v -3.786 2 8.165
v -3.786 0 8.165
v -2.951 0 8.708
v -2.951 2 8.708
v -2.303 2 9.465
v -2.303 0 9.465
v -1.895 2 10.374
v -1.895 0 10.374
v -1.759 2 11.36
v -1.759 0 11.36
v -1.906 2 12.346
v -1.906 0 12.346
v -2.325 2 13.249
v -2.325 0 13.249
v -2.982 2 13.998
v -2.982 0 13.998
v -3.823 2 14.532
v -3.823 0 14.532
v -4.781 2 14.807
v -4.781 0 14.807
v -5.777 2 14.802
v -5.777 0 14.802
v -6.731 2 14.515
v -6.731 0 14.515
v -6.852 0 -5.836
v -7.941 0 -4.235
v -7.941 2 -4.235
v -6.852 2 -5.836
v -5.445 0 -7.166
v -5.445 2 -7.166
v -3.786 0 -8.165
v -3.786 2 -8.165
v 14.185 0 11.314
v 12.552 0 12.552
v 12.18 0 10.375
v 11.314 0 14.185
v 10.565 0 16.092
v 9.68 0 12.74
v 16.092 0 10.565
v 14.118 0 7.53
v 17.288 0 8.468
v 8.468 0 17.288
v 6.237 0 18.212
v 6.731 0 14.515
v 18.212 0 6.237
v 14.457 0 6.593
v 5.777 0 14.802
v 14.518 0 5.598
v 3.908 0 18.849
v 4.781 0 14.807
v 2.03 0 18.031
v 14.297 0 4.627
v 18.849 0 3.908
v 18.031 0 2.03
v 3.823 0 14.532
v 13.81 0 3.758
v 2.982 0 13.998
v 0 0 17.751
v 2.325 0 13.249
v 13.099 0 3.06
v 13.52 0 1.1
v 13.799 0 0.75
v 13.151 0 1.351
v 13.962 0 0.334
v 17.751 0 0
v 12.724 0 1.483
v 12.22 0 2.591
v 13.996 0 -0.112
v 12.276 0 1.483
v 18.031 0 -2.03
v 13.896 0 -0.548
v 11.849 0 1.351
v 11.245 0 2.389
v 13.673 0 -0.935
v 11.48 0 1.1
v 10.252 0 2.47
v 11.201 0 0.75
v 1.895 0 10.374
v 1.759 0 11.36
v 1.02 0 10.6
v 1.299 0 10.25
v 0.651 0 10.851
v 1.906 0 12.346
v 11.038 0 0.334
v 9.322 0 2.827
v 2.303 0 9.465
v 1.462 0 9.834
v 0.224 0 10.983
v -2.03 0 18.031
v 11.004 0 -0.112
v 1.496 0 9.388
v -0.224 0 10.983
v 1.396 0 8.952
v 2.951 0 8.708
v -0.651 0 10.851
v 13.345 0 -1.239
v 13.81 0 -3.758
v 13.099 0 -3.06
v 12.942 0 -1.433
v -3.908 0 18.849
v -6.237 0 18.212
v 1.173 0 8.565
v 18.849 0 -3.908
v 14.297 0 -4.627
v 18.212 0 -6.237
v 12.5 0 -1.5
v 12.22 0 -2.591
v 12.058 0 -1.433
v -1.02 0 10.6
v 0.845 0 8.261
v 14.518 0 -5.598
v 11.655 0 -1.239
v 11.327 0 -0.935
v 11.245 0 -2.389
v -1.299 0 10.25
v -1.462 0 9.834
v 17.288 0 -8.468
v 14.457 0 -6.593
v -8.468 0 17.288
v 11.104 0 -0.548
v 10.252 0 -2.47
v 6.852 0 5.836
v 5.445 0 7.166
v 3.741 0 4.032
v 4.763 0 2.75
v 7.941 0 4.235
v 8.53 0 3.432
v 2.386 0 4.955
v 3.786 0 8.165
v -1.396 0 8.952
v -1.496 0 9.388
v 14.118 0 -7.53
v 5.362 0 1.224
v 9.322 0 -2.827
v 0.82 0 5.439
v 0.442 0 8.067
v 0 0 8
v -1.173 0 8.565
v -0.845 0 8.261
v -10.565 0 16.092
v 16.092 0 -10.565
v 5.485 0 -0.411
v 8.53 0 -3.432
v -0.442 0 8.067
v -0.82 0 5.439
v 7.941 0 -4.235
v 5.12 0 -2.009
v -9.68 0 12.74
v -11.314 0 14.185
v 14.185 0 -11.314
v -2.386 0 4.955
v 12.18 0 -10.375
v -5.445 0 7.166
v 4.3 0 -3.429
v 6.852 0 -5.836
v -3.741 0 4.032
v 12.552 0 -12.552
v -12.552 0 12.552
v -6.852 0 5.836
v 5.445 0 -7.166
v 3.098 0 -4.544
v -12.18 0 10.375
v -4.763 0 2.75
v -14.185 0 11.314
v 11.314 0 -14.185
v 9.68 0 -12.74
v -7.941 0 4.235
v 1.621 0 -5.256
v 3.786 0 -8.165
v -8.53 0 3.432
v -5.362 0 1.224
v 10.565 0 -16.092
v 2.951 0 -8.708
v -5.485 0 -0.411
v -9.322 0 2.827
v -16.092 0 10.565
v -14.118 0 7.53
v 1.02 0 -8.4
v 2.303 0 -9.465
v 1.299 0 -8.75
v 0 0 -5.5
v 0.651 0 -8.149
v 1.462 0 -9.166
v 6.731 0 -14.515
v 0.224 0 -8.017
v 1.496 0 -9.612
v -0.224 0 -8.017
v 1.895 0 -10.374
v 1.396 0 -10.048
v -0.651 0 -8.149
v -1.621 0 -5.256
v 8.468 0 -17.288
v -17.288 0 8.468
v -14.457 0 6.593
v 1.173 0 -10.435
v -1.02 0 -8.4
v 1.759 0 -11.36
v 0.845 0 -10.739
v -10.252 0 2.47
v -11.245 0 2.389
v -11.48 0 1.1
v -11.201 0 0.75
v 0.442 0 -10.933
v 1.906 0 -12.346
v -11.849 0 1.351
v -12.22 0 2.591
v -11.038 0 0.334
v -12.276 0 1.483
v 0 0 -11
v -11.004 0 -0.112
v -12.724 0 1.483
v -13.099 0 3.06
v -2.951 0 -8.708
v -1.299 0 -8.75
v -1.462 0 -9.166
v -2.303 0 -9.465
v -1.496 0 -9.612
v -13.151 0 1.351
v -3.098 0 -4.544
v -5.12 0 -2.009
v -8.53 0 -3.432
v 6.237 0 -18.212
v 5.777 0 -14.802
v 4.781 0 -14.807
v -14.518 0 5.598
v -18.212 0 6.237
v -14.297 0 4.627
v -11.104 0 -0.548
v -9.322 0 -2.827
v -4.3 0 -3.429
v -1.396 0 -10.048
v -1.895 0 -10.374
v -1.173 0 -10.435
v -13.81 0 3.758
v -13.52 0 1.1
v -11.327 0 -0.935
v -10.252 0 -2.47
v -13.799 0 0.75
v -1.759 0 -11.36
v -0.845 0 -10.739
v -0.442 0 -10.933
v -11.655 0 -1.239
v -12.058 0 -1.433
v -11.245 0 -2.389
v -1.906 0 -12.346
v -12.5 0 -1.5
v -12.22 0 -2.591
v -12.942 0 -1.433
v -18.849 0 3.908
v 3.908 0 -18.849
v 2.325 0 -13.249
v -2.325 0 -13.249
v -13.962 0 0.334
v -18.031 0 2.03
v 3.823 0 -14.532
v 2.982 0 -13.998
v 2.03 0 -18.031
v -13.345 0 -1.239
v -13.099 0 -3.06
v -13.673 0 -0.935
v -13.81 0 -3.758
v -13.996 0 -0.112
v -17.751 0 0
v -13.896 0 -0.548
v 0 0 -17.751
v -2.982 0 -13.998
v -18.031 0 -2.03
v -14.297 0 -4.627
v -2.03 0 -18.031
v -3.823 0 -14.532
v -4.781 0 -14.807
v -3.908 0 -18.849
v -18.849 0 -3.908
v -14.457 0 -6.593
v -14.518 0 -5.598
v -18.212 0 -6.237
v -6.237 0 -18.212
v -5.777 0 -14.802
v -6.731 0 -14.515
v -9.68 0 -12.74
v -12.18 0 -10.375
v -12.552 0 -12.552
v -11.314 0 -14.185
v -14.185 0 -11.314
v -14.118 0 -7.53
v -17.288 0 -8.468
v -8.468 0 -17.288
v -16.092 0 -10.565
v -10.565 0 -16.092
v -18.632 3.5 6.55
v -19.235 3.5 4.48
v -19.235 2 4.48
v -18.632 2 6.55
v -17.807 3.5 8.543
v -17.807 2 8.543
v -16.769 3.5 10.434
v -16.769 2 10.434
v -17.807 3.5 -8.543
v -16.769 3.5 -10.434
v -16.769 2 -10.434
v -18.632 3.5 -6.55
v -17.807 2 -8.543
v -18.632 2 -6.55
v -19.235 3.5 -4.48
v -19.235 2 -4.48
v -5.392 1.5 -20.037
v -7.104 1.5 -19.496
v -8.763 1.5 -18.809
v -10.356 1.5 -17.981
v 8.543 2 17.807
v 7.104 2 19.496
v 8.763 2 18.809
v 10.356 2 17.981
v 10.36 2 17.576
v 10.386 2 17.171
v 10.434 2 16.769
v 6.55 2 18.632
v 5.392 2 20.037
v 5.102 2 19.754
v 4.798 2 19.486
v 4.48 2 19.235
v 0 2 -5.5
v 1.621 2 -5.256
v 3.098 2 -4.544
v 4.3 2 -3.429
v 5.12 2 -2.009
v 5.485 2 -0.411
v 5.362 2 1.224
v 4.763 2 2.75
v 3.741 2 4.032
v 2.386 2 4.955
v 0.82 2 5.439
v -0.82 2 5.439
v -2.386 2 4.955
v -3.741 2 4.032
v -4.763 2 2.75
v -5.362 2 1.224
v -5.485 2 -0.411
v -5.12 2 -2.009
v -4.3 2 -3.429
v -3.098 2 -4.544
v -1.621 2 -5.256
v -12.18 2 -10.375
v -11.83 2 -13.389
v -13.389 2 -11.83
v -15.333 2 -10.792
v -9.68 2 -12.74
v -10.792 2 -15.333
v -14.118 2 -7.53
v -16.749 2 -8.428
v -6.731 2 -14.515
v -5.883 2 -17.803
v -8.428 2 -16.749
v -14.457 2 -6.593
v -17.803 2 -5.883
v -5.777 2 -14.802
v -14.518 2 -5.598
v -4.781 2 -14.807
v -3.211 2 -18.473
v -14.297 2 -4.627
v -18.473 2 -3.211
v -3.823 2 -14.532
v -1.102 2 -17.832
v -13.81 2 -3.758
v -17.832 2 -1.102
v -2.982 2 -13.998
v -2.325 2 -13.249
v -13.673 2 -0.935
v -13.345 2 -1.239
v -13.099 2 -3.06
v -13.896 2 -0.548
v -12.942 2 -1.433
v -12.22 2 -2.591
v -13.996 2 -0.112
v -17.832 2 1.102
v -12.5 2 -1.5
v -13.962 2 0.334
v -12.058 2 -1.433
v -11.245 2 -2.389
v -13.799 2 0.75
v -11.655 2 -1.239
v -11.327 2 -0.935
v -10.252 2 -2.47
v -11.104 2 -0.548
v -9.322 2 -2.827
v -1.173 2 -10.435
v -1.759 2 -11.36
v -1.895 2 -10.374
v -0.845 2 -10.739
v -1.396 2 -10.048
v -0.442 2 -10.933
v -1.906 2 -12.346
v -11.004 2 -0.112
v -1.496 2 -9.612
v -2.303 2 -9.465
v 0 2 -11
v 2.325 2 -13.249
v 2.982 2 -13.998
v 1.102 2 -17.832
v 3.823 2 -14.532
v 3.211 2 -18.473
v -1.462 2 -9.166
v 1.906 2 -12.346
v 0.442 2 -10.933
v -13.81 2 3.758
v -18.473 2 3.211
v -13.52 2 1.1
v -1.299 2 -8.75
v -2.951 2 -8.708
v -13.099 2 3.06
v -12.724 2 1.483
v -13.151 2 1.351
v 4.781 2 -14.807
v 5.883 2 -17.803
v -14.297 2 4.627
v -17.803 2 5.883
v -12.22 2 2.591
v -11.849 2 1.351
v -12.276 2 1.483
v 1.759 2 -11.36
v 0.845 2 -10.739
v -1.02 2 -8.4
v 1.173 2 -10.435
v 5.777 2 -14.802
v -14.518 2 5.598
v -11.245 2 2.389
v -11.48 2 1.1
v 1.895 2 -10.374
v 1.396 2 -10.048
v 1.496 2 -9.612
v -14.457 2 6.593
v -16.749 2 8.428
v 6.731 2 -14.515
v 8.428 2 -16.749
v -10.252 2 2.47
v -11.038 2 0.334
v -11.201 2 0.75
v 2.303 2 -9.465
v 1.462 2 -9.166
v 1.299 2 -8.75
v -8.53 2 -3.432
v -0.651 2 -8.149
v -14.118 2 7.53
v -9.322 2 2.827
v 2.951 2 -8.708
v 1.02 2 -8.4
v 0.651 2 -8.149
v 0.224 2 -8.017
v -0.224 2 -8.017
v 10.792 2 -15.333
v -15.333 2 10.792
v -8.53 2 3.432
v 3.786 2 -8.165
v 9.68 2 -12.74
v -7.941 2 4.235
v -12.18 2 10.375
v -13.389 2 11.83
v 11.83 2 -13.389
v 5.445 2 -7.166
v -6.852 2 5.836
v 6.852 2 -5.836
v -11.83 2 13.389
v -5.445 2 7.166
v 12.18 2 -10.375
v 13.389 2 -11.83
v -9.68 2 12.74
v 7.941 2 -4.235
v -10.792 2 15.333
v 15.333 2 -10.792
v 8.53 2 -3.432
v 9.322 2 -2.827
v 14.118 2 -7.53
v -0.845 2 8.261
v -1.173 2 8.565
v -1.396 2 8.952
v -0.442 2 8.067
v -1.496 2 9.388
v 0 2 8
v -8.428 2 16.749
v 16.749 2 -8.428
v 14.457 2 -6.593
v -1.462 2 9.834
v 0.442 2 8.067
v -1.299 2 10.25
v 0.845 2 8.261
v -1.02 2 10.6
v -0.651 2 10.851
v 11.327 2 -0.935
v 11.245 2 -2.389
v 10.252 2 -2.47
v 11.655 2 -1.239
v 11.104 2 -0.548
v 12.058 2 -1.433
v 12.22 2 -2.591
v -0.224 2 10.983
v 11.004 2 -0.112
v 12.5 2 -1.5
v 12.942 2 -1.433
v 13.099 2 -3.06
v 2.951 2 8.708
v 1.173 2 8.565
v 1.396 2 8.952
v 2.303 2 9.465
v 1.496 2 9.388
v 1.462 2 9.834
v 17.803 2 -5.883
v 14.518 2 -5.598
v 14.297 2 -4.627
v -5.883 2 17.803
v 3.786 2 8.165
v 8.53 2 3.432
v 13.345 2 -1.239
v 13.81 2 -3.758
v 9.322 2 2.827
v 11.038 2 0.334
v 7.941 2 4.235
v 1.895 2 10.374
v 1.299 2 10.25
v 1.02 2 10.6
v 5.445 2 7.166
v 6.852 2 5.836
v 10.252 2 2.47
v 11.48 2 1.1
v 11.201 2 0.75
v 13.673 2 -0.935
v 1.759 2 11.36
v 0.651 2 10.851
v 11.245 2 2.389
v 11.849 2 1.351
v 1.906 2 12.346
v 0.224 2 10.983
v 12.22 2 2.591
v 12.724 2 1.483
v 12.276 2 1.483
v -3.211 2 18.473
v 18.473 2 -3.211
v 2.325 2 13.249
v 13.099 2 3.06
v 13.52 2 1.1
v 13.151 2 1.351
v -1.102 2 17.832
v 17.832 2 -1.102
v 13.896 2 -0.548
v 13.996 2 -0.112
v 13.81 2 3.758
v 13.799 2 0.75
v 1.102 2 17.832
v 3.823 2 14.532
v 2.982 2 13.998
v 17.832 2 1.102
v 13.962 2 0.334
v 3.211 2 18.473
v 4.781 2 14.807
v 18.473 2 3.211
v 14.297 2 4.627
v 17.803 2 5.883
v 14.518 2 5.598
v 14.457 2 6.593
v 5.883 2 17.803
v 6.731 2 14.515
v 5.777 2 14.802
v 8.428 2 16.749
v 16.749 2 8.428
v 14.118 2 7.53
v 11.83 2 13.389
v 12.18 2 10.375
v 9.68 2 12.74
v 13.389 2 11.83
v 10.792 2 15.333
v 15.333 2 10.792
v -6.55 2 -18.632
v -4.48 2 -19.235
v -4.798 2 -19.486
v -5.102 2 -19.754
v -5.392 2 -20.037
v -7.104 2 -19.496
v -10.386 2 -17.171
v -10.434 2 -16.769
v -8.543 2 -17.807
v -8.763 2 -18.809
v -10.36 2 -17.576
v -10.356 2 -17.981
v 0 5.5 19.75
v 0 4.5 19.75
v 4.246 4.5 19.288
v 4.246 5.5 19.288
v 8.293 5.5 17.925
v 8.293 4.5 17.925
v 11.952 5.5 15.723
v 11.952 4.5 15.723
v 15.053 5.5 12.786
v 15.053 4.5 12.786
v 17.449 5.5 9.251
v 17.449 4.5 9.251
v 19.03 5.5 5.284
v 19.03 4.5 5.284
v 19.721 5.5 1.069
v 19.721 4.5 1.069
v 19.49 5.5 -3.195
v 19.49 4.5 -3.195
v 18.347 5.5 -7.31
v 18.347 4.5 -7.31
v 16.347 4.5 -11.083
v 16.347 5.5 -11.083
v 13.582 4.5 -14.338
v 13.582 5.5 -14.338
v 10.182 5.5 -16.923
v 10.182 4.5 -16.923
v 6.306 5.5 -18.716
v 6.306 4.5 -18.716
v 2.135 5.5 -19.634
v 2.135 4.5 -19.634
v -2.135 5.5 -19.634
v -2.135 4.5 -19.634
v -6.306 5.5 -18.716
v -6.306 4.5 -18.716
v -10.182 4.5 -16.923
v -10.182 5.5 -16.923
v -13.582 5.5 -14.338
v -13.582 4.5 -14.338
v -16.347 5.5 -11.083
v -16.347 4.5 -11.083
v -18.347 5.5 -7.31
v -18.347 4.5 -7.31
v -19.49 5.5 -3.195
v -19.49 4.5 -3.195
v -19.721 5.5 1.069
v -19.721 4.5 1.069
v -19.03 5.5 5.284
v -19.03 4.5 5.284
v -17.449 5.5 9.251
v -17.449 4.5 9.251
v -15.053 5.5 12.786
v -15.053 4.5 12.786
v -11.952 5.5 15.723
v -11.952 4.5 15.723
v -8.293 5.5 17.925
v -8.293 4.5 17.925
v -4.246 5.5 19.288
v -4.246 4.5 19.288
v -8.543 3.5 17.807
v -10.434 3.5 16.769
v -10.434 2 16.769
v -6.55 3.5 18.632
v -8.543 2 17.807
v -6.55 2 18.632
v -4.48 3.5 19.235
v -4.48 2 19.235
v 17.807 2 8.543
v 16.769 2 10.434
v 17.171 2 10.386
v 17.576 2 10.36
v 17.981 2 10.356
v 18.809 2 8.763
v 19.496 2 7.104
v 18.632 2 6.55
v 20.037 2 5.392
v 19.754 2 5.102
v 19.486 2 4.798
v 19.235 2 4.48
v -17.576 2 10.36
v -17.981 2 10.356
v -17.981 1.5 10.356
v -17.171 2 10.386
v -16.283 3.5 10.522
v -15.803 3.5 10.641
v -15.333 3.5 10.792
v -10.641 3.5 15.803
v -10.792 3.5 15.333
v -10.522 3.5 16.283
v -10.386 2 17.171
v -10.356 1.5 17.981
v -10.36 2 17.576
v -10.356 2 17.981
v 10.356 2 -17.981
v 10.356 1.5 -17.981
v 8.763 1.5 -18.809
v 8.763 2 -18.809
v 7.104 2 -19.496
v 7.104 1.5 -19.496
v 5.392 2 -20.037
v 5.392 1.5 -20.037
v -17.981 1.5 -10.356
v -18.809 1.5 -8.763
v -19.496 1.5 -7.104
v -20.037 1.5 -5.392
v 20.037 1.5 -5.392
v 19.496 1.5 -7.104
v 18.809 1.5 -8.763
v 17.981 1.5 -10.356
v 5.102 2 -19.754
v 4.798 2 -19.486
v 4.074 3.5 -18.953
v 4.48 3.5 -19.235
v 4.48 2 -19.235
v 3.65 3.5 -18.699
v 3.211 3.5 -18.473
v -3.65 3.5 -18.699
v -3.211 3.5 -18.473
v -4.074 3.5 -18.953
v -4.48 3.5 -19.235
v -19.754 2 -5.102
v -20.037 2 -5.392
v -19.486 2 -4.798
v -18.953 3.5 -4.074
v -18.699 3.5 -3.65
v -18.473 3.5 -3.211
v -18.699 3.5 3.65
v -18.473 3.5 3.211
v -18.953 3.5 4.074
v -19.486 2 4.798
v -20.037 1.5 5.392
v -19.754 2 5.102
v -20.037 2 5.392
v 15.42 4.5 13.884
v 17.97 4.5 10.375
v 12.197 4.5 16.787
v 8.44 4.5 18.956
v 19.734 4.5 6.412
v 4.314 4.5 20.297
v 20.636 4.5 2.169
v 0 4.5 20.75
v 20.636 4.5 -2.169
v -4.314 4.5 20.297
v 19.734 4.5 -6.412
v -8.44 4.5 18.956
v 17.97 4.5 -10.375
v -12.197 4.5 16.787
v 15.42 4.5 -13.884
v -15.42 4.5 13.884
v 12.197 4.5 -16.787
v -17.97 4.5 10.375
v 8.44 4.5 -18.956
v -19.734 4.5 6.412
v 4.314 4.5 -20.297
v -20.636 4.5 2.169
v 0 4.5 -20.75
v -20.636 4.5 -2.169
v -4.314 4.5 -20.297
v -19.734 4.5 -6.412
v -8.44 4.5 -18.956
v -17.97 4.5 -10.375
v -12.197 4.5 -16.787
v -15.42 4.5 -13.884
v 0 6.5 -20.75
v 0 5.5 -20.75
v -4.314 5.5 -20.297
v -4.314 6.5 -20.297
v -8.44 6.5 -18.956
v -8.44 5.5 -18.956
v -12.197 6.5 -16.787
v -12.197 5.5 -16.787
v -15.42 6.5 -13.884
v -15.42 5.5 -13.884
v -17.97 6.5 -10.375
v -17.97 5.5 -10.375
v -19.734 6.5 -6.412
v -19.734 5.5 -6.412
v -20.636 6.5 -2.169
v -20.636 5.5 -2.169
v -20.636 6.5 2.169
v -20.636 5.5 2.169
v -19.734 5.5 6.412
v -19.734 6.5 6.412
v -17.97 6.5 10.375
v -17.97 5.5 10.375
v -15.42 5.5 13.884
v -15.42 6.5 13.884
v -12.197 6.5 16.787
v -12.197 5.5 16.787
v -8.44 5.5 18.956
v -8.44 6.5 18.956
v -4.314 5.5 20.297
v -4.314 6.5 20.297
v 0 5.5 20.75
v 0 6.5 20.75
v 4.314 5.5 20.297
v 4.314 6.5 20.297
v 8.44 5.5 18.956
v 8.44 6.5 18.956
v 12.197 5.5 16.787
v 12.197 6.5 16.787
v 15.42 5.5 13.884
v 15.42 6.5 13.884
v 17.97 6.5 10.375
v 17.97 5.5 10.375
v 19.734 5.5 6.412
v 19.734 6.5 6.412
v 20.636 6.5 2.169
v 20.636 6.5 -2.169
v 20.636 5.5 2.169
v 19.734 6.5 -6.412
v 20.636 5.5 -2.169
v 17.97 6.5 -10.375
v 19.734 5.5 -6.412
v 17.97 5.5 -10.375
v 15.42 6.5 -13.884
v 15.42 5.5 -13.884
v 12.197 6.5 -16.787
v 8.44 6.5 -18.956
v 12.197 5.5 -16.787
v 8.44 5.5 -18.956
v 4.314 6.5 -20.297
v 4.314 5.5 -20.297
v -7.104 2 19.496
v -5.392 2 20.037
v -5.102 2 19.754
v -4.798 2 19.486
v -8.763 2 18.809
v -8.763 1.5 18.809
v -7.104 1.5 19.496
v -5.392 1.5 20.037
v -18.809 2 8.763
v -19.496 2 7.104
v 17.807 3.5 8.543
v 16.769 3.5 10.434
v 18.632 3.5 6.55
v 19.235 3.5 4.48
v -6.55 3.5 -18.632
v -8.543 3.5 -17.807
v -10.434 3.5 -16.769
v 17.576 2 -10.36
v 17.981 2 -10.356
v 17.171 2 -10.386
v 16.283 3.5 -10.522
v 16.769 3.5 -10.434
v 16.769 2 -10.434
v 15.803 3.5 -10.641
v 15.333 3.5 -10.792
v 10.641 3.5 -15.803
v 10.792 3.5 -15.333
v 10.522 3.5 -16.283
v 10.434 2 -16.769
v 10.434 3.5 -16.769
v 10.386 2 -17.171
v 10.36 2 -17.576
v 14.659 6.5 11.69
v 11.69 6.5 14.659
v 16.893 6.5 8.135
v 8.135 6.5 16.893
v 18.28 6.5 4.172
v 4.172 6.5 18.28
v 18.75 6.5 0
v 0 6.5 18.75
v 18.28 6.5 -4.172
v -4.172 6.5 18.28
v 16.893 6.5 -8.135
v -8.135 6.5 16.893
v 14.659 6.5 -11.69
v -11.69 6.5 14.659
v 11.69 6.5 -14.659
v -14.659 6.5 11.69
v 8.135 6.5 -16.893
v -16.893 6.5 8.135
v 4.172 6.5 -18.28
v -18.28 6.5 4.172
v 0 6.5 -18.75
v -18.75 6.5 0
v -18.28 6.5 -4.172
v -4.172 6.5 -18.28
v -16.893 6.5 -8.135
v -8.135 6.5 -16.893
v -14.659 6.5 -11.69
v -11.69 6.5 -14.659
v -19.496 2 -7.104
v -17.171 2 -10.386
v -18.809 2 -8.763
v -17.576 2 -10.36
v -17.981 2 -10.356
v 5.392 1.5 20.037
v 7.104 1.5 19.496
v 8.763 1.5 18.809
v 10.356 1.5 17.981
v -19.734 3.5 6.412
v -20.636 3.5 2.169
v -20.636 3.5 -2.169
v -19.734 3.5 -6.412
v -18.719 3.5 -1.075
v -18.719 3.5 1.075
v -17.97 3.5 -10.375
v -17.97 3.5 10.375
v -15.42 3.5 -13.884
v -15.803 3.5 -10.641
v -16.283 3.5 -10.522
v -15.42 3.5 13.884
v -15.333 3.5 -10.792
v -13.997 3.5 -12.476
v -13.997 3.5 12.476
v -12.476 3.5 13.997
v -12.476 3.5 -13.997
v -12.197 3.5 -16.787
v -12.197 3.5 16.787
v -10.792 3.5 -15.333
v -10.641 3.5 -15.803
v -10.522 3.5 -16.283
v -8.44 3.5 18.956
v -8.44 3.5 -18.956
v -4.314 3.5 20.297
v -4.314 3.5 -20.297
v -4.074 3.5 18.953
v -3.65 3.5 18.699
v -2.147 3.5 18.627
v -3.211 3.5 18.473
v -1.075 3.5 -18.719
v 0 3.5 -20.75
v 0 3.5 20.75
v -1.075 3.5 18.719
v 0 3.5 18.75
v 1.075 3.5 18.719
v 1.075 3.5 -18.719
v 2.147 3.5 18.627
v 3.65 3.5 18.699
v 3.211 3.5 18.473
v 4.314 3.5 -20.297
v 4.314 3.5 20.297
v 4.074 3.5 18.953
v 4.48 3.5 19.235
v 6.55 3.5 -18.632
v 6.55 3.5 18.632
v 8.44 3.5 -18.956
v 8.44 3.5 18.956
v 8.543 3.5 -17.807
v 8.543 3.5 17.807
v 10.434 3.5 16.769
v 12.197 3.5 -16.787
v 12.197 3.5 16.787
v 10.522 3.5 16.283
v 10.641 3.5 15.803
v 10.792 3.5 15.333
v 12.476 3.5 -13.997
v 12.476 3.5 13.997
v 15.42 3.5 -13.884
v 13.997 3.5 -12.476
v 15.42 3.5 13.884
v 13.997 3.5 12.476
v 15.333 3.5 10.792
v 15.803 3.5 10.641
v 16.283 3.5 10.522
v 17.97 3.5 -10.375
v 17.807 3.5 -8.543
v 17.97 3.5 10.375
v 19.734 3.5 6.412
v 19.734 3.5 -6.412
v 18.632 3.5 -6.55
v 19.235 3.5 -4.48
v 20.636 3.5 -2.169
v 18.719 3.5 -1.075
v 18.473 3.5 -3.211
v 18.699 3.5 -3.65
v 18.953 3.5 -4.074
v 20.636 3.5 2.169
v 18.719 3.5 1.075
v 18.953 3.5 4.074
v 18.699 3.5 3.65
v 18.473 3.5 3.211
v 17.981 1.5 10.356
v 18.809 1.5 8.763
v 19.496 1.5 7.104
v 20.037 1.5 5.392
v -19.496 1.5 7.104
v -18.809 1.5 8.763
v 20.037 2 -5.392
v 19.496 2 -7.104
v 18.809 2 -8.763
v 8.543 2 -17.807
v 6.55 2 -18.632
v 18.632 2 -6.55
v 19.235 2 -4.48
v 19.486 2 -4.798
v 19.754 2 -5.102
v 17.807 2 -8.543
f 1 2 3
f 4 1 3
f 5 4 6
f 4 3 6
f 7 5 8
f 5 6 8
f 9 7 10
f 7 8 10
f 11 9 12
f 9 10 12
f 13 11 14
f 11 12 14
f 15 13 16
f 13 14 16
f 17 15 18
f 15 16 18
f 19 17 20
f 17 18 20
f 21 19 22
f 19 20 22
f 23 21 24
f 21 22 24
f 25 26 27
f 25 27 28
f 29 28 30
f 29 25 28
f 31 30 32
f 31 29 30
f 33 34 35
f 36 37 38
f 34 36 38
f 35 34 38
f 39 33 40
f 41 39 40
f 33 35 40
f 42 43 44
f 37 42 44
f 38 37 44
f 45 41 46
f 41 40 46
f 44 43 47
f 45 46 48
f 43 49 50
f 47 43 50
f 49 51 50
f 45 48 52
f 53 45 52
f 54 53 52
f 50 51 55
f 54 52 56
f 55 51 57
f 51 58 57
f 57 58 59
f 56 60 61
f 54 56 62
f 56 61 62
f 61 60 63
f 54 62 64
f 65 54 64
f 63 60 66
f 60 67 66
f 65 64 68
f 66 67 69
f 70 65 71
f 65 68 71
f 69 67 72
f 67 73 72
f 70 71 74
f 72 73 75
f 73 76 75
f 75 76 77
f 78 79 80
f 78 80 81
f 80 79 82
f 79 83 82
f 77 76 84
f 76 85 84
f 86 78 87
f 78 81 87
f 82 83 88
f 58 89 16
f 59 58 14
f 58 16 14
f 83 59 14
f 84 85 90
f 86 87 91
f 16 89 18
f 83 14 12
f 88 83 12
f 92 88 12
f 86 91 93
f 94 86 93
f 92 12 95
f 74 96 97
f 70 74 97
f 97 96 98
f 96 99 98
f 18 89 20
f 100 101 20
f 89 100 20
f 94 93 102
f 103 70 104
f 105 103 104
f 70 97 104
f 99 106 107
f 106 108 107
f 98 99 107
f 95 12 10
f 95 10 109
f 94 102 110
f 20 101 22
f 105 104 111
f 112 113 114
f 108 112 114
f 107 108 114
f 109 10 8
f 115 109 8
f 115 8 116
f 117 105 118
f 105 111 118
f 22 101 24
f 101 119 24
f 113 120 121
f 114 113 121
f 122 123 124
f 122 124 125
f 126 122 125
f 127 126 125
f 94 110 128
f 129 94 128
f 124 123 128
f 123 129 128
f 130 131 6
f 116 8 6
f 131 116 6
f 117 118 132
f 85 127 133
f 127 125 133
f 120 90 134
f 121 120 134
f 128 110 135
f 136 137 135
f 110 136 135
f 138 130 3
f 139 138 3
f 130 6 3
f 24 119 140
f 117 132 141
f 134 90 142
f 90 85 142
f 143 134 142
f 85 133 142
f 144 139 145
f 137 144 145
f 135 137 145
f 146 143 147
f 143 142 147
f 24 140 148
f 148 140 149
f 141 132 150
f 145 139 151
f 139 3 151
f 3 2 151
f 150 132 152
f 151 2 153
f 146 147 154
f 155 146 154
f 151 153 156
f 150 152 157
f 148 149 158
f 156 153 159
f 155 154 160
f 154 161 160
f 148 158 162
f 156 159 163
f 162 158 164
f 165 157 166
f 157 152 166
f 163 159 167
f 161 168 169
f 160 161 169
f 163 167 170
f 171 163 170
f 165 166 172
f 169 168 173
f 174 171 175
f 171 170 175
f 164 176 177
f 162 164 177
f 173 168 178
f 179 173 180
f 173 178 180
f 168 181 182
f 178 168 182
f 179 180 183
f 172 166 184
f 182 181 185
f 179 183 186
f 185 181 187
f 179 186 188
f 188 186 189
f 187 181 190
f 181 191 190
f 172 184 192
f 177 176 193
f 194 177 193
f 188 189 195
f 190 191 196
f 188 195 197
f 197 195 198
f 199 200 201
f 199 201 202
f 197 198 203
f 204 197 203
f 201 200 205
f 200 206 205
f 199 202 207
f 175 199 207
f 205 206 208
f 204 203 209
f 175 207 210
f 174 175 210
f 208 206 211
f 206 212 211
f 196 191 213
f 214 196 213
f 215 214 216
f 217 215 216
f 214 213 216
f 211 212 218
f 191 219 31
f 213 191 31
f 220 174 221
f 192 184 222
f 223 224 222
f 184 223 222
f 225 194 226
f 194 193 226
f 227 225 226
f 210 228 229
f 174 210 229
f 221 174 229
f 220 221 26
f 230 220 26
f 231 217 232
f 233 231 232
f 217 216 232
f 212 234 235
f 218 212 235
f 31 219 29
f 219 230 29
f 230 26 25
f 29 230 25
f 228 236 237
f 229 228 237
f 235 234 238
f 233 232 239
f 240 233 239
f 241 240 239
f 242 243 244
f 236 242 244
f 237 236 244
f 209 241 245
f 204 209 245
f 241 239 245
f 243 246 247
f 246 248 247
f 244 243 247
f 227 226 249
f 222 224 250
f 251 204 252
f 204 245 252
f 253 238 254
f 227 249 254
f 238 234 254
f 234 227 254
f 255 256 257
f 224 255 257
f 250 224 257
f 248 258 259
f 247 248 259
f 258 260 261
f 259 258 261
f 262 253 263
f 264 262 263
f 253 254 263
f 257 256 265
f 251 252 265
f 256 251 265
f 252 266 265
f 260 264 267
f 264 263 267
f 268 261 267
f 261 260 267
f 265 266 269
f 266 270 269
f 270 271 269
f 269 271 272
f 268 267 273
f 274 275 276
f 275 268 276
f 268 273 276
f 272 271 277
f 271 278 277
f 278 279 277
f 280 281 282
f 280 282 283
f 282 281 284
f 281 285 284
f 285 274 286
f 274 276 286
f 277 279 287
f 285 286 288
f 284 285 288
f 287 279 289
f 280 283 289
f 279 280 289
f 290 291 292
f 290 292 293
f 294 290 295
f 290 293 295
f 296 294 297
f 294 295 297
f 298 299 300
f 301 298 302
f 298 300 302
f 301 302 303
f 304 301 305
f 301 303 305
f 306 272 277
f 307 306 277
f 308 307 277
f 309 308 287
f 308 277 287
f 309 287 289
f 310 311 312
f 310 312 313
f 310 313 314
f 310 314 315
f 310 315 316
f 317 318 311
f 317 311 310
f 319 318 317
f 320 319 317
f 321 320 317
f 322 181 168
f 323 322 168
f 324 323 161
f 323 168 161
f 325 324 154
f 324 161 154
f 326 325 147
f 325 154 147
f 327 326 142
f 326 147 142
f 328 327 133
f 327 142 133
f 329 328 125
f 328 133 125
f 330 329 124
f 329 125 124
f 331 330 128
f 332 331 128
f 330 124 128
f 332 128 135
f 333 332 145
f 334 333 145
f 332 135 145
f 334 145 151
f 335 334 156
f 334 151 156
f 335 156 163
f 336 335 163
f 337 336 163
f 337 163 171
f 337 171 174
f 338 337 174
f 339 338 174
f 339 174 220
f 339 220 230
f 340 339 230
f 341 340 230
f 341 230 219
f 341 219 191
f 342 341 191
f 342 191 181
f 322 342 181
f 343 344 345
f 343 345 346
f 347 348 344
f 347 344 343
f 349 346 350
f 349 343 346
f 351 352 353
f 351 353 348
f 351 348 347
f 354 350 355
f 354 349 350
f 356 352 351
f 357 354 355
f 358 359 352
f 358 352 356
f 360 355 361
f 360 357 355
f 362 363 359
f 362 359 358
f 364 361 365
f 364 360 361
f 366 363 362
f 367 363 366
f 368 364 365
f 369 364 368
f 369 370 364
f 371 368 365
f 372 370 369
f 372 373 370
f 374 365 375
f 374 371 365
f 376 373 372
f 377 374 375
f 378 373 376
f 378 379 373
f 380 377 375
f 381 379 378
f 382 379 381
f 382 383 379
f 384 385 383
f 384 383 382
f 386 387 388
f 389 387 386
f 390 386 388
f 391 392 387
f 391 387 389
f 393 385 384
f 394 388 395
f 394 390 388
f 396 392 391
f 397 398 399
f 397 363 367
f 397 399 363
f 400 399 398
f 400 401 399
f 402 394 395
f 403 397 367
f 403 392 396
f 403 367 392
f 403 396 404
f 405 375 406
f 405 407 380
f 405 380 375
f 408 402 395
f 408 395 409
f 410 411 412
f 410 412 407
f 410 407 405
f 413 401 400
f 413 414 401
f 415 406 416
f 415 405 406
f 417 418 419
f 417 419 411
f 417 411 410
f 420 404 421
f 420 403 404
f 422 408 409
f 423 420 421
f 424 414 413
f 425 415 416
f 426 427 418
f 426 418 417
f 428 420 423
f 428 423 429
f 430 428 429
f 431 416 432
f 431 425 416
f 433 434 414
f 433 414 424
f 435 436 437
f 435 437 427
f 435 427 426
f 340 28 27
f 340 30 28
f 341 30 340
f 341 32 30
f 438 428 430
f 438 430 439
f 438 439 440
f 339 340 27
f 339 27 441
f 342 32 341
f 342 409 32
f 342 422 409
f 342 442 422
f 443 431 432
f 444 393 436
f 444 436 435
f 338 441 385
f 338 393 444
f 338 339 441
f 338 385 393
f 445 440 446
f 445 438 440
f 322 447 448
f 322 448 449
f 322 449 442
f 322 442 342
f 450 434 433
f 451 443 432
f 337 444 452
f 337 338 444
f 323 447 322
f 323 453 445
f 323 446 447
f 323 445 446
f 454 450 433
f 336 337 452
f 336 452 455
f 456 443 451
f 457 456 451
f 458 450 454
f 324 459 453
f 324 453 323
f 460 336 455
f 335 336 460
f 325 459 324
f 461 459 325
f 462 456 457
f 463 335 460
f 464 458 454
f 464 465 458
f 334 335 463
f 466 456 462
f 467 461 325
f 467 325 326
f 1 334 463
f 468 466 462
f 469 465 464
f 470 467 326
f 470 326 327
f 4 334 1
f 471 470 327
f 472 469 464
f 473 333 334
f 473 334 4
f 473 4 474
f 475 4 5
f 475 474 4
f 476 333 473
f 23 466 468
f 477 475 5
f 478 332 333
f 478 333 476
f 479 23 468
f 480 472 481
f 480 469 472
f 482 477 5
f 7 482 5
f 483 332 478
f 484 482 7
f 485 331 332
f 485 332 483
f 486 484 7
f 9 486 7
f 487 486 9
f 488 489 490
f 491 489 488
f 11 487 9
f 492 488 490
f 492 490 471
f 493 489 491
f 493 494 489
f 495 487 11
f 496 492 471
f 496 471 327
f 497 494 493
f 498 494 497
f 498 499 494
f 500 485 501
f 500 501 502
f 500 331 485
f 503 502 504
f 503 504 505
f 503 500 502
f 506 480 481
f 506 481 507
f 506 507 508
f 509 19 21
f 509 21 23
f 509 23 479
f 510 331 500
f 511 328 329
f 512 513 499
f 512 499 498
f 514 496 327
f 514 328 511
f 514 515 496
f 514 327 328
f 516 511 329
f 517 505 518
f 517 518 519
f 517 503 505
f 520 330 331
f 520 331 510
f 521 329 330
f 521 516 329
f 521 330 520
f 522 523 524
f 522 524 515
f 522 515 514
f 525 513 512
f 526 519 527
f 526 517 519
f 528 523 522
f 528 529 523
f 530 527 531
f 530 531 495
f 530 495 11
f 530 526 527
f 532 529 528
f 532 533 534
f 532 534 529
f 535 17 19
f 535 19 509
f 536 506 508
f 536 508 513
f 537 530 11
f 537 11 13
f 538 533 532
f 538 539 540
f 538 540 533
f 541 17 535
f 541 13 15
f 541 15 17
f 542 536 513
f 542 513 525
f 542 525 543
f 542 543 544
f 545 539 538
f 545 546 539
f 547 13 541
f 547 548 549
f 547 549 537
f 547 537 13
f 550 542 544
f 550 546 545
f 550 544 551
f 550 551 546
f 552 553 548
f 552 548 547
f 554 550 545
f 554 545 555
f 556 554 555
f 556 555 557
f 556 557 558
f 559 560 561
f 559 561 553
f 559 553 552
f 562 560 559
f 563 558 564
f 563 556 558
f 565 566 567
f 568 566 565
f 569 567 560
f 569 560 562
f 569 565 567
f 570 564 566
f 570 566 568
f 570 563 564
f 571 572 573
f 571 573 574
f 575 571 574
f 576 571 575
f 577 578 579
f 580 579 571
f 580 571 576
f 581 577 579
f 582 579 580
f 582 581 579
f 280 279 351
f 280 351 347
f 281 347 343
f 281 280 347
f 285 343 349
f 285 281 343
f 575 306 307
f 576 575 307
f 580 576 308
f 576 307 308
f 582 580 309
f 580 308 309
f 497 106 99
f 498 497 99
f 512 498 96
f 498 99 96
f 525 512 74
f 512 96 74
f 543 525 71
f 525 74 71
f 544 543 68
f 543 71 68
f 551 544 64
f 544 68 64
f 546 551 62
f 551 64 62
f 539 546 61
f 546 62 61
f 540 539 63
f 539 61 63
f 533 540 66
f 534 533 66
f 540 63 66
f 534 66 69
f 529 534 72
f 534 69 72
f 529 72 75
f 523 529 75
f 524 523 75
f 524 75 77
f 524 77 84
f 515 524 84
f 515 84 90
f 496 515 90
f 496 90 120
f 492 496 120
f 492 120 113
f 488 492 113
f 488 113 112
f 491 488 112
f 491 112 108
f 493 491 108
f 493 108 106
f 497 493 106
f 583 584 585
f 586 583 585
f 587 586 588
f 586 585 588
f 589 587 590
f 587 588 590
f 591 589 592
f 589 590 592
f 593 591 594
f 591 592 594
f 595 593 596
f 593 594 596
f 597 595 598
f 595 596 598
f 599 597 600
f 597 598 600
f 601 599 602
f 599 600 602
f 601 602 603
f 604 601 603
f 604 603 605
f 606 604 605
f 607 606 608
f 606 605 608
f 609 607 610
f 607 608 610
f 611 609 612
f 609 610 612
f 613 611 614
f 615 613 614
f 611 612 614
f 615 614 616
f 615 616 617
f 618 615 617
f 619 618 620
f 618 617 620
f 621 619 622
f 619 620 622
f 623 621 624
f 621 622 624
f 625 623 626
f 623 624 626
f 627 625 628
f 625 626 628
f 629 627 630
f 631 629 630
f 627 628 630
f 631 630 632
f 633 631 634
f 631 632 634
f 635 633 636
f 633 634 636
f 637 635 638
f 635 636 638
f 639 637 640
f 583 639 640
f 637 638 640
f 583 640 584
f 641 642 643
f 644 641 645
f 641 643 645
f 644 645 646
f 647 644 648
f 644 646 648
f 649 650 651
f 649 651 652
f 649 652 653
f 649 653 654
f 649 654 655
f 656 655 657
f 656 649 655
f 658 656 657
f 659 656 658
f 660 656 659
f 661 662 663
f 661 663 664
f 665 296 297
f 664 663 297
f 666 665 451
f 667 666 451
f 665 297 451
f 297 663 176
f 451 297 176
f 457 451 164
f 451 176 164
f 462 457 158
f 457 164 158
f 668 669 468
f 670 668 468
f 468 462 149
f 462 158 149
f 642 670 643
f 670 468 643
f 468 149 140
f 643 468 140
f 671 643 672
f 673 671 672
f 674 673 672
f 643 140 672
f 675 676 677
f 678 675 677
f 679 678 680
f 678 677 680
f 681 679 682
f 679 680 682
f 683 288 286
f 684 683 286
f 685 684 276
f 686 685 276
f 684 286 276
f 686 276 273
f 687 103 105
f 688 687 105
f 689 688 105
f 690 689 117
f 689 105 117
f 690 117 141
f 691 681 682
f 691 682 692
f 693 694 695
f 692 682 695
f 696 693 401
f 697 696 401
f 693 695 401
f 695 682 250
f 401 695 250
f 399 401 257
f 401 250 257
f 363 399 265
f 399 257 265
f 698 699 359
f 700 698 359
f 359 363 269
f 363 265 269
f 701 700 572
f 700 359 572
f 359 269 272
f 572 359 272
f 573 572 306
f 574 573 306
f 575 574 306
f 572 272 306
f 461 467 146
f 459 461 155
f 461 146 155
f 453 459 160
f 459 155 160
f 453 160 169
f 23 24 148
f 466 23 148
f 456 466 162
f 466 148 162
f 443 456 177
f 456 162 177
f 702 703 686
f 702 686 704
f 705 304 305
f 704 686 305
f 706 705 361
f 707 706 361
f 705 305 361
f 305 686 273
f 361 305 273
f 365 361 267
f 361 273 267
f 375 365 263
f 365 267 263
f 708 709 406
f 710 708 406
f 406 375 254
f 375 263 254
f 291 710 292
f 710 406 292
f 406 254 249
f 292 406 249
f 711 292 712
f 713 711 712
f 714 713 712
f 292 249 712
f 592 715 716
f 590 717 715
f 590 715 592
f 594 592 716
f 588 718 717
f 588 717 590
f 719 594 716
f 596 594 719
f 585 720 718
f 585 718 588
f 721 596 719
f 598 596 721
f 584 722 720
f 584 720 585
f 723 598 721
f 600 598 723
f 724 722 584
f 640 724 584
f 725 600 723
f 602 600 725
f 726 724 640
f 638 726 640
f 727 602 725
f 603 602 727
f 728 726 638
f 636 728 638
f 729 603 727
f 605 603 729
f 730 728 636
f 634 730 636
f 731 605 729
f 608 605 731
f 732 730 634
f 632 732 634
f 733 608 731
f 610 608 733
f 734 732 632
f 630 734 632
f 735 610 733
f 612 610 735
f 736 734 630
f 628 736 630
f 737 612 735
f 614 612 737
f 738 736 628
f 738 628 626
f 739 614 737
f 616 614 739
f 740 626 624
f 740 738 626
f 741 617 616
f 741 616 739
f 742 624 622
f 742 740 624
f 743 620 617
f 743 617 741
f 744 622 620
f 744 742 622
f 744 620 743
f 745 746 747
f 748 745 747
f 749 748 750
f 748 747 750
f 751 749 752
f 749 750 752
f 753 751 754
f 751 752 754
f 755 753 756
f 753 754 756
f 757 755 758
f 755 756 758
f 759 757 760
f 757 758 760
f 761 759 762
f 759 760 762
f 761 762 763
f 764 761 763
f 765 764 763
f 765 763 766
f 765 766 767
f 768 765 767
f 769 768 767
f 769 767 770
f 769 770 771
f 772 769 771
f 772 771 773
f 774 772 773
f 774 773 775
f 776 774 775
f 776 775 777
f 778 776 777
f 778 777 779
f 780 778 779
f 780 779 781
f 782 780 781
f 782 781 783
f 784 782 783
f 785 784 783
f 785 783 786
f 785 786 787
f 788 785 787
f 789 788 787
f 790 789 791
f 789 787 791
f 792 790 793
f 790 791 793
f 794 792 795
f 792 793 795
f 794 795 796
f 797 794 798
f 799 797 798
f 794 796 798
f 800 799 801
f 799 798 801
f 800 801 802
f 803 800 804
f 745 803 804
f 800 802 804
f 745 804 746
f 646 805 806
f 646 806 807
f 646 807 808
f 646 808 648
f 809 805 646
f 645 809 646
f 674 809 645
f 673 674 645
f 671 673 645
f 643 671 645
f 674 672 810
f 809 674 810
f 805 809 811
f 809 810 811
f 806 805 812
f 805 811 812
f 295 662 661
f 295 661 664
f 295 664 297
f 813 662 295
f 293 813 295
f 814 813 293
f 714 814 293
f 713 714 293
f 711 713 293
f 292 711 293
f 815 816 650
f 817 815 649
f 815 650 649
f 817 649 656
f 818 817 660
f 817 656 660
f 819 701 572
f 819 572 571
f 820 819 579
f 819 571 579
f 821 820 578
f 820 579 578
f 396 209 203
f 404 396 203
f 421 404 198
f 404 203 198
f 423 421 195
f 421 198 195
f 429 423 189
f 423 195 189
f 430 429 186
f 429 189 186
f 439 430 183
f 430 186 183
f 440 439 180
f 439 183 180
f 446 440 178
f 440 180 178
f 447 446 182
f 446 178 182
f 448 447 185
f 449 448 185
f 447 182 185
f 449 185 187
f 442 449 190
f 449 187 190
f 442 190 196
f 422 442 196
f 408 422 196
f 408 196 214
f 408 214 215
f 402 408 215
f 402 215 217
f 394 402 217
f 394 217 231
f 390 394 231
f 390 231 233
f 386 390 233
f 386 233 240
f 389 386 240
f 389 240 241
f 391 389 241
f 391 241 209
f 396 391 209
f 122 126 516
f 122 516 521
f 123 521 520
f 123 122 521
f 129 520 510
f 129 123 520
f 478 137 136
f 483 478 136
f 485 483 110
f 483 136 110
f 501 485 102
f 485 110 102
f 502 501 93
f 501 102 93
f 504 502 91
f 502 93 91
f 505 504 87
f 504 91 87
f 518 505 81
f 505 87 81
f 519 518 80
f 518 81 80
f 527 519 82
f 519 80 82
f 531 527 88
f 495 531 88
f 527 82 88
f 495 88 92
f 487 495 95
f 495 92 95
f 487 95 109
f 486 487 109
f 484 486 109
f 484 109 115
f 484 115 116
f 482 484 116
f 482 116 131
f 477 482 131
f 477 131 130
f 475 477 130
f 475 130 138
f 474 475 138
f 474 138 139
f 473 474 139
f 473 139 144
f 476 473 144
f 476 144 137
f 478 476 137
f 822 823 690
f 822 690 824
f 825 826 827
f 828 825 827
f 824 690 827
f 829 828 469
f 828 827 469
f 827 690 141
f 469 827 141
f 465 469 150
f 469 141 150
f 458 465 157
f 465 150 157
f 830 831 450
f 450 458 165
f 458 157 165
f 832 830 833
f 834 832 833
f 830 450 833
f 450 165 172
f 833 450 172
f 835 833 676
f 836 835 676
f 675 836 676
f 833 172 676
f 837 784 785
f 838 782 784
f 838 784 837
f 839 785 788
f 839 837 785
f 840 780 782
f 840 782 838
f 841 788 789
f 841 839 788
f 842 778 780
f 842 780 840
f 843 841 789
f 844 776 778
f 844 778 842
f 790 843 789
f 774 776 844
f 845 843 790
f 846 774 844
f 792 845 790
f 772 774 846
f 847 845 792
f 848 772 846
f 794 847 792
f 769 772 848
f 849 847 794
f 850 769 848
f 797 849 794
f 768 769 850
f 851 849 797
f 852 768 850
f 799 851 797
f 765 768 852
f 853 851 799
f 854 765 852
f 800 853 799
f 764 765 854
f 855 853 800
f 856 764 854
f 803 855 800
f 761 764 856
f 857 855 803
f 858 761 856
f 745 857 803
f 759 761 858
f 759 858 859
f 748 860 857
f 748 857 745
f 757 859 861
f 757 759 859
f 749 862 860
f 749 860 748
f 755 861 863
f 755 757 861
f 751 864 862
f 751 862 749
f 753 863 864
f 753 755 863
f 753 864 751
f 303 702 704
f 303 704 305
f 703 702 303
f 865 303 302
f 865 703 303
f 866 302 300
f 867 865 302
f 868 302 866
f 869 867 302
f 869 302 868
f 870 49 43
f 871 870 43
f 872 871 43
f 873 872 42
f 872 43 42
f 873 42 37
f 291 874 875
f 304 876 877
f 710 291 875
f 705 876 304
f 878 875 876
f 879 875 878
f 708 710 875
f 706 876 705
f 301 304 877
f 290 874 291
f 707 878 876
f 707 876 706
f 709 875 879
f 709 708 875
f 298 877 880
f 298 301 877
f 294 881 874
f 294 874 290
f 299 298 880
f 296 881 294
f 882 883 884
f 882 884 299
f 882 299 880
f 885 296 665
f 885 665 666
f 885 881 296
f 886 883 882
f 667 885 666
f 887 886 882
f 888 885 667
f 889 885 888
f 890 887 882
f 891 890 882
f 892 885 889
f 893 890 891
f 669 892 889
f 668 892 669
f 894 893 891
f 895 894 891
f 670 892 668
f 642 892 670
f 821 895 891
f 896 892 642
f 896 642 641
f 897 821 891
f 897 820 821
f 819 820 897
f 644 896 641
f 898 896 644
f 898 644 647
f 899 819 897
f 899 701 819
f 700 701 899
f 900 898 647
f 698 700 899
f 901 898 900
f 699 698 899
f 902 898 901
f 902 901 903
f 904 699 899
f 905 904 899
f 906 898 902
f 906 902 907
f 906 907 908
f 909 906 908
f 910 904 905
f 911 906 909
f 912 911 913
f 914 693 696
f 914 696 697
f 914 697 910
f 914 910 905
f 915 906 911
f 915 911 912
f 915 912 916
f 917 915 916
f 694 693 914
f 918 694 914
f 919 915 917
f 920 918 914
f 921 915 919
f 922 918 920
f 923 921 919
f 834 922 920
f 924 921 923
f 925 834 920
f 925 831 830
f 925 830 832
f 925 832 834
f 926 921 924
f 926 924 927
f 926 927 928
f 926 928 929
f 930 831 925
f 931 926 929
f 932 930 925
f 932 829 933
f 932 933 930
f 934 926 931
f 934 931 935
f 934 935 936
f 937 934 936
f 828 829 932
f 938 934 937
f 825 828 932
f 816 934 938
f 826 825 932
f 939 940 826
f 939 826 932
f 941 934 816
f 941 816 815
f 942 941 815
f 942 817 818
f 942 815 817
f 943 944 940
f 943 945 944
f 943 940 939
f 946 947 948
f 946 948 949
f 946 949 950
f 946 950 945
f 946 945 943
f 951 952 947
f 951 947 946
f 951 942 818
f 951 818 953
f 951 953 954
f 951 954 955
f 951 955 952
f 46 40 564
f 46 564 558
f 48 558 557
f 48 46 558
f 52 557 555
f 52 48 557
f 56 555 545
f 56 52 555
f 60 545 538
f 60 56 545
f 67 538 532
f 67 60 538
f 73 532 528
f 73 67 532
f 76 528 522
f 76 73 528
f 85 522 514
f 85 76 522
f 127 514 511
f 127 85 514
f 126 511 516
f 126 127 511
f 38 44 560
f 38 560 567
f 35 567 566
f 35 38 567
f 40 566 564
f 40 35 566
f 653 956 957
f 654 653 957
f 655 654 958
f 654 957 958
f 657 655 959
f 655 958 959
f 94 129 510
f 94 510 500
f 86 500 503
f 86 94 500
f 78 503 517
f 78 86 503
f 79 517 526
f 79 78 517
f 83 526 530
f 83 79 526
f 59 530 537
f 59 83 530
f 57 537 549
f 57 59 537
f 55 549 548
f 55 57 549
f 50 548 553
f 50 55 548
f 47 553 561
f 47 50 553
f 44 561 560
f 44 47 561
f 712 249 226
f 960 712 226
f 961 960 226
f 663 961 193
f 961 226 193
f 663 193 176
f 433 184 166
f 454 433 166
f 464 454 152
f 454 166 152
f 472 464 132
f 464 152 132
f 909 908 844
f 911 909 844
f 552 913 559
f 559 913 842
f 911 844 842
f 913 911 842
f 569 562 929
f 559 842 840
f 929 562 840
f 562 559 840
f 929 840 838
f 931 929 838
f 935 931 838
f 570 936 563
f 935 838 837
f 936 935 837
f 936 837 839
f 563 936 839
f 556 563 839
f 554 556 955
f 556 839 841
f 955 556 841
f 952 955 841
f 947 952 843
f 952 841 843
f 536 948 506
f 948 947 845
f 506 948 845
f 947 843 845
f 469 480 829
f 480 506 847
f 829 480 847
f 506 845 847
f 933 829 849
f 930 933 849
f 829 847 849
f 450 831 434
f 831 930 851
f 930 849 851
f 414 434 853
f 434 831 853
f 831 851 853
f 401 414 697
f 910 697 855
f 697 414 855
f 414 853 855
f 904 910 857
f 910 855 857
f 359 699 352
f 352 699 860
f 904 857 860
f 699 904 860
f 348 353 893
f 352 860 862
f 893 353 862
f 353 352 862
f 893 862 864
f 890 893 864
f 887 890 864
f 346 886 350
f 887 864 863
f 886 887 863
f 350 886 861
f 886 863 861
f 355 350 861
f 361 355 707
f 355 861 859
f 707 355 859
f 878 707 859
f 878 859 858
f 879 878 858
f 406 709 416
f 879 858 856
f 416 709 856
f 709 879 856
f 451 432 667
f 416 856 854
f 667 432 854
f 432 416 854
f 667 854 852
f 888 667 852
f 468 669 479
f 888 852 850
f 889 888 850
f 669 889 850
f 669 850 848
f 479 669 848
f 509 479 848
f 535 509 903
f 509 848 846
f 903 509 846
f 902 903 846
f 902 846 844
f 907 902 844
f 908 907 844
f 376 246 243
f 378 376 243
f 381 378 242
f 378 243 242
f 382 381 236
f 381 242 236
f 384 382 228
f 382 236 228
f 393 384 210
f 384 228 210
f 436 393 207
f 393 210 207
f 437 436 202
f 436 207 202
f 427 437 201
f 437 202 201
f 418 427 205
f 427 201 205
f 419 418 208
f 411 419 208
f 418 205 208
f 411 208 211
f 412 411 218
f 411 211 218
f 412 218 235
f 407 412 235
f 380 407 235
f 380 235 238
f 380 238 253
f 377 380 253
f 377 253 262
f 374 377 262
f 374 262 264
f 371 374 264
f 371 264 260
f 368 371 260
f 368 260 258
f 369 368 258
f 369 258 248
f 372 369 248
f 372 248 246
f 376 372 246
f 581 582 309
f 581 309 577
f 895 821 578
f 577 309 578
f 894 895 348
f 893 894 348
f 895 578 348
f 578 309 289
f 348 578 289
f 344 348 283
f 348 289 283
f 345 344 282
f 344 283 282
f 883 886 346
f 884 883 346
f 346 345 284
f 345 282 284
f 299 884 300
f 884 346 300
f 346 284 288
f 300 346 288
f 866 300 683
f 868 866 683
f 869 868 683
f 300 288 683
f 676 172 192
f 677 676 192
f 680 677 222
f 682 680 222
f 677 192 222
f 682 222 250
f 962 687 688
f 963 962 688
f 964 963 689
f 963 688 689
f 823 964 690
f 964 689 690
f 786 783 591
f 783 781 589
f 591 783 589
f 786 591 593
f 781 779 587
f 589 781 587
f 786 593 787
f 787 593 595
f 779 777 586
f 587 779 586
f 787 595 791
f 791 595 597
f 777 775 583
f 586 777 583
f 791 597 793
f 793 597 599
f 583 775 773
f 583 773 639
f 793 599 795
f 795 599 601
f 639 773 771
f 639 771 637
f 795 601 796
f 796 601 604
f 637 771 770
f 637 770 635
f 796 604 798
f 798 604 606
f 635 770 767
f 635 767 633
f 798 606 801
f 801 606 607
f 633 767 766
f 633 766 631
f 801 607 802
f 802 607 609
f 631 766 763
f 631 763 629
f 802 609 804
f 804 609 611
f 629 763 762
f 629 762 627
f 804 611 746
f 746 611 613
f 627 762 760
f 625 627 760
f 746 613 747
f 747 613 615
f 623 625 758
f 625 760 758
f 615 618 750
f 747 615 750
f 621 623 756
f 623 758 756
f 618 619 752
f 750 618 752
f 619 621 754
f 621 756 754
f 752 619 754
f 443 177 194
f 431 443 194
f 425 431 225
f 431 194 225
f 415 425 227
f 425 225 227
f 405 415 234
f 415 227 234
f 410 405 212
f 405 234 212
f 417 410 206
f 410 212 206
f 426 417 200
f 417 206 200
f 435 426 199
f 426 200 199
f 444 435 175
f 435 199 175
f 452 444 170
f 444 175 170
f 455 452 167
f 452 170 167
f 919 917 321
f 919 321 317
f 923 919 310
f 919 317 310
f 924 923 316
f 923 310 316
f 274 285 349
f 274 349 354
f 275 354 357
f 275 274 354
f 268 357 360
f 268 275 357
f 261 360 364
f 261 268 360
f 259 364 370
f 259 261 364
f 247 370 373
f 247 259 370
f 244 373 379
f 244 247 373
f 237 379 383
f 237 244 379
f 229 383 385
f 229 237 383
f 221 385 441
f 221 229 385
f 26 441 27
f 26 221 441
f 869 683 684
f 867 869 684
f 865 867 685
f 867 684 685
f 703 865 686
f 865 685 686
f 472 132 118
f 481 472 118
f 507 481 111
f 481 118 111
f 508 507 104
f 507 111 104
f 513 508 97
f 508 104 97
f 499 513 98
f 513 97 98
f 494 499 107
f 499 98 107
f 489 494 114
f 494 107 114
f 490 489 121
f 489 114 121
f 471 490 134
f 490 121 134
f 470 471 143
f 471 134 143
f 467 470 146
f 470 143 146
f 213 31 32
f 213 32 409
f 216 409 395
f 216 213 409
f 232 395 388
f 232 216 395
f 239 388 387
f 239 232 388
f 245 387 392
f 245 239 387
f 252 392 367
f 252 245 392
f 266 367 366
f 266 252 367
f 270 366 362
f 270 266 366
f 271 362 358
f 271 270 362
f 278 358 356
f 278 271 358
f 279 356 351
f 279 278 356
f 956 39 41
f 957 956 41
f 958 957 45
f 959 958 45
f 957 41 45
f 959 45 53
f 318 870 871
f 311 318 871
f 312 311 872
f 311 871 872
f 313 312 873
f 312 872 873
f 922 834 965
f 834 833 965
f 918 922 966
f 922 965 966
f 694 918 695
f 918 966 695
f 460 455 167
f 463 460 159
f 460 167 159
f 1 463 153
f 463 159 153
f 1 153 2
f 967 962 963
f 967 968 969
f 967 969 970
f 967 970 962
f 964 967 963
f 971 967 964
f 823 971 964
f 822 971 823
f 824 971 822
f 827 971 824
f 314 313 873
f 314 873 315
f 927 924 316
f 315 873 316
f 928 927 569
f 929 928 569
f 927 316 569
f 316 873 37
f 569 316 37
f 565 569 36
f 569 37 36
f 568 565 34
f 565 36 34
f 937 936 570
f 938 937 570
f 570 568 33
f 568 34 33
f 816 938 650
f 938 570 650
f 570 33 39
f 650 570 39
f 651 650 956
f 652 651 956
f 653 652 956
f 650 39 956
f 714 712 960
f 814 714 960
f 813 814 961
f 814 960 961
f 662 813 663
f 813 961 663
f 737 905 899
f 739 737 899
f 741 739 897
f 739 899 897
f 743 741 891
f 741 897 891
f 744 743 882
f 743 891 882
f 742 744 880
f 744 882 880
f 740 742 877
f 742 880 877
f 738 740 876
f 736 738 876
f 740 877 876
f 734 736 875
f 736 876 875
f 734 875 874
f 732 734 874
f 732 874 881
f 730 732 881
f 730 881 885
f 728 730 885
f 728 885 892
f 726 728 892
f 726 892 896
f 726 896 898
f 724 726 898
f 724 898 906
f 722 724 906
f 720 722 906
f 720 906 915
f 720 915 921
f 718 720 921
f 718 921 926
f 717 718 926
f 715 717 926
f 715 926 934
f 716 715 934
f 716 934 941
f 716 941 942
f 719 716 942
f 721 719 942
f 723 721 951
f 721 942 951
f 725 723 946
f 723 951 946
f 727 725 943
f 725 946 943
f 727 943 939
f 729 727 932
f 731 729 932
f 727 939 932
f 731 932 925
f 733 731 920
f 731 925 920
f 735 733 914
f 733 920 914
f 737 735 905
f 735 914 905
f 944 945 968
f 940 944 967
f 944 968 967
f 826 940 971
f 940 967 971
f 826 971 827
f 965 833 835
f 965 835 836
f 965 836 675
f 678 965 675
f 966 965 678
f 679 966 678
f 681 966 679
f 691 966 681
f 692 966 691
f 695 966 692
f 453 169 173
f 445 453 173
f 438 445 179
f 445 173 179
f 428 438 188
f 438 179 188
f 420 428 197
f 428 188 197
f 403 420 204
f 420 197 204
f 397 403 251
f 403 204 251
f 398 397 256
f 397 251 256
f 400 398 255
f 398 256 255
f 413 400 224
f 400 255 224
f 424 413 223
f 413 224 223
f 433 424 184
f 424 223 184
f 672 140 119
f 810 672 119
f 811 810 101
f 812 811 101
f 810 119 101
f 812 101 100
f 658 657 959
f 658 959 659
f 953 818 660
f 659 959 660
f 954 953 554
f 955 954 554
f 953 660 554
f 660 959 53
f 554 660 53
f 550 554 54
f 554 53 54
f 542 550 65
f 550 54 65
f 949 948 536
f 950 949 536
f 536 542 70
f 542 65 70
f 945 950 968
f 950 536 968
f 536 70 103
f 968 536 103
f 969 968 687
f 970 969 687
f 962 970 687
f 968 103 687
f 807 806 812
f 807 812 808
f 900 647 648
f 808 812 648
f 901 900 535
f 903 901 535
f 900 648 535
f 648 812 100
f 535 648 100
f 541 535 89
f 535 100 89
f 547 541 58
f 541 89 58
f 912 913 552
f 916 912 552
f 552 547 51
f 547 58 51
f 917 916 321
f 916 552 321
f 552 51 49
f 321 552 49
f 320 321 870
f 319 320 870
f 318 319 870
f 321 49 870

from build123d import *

# Parameters (mm, degrees)
SKETCH1_R           = 20.75
BOSS_EXTRUDE1_DEPTH = 6.5
CUT_EXTRUDE1_START  = -1
SKETCH2_R           = 20.75
SKETCH2_R_2         = 19.75
CUT_EXTRUDE1_DEPTH  = 1
CUT_EXTRUDE2_START  = -1.5
SKETCH3_R           = 20.75
SKETCH3_R_2         = 19.75
CUT_EXTRUDE2_DEPTH  = 1.5
CHAMFER1_SIZE       = 1.5
SKETCH4_R           = 18.75
CUT_EXTRUDE3_DEPTH  = 4.5
CUT_EXTRUDE4_DEPTH  = 3.5
CIRPATTERN1_COUNT   = 8
SKETCH6_R           = 1.5
SKETCH6_R_2         = 5.5
CUT_EXTRUDE5_DEPTH  = 3.5


with BuildPart() as part:
    # Sketch1 → Boss-Extrude1 (new body)
    with BuildSketch(Plane(origin=(0, 0, 0), x_dir=(1, 0, 0), z_dir=(0, 1, 0))):
        Circle(SKETCH1_R)
    extrude(amount=BOSS_EXTRUDE1_DEPTH)

    # Sketch2 → Cut-Extrude1 (cut)
    with BuildSketch(Plane(origin=(0, 5.5, 0), x_dir=(1, 0, 0), z_dir=(0, 1, 0)).offset(CUT_EXTRUDE1_START)):
        Circle(SKETCH2_R)
        Circle(SKETCH2_R_2, mode=Mode.SUBTRACT)
    extrude(amount=CUT_EXTRUDE1_DEPTH, mode=Mode.SUBTRACT)

    # Sketch3 → Cut-Extrude2 (cut)
    with BuildSketch(Plane(origin=(0, 3.5, 0), x_dir=(1, 0, 0), z_dir=(0, 1, 0)).offset(CUT_EXTRUDE2_START)):
        Circle(SKETCH3_R)
        Circle(SKETCH3_R_2, mode=Mode.SUBTRACT)
    extrude(amount=CUT_EXTRUDE2_DEPTH, mode=Mode.SUBTRACT)

    # Chamfer1
    chamfer1_edges = [part.edges().sort_by_distance(p)[0] for p in [
        (-20.75, 0, 0),
    ]]
    chamfer(chamfer1_edges, length=CHAMFER1_SIZE)

    # Sketch4 → Cut-Extrude3 (cut)
    with BuildSketch(Plane(origin=(0, 6.5, 0), x_dir=(1, 0, 0), z_dir=(0, 1, 0))):
        Circle(SKETCH4_R)
    extrude(amount=-CUT_EXTRUDE3_DEPTH, mode=Mode.SUBTRACT)

    # Sketch5 → Cut-Extrude4 (cut)
    with BuildSketch(Plane.XZ):
        with BuildLine():
            ThreePointArc((6, -20.75), (0, -17.750879894), (-6, -20.75))
            ThreePointArc((-6, -20.75), (0, -23.235281374), (6, -20.75))
        make_face()
    cut_extrude4 = extrude(amount=-CUT_EXTRUDE4_DEPTH, mode=Mode.SUBTRACT)

    # CirPattern1: Cut-Extrude4 ×8 about axis
    cirpattern1_axis = Axis((0, 6.5, 0), (0, -1, 0))
    for i in range(1, CIRPATTERN1_COUNT):
        add(cut_extrude4.rotate(cirpattern1_axis, i * 360 / CIRPATTERN1_COUNT), mode=Mode.SUBTRACT)

    # Sketch6 → Cut-Extrude5 (cut)
    with BuildSketch(Plane(origin=(0, 0, 0), x_dir=(-1, 0, 0), z_dir=(0, -1, 0))):
        with Locations((0, 9.5)):
            Circle(SKETCH6_R)
        with Locations((-12.5, 0)):
            Circle(SKETCH6_R)
        with BuildLine():
            ThreePointArc((-14.117584779, 7.529528538), (-12.676447476, 2.7942225), (-7.941141438, 4.235359803))
            ThreePointArc((-7.941141438, 4.235359803), (-6.184060598, 6.538913863), (-3.786151182, 8.164867374))
            ThreePointArc((-3.786151182, 8.164867374), (-2.083317107, 12.812485701), (-6.730935434, 14.515319775))
            ThreePointArc((-6.730935434, 14.515319775), (-10.993885508, 11.624735757), (-14.117584779, 7.529528538))
        make_face()
        with Locations((12.5, 0)):
            Circle(SKETCH6_R)
        with Locations((0, -9.5)):
            Circle(SKETCH6_R)
        with BuildLine():
            ThreePointArc((7.941141438, 4.235359803), (12.676447476, 2.7942225), (14.117584779, 7.529528538))
            ThreePointArc((14.117584779, 7.529528538), (10.993885508, 11.624735757), (6.730935434, 14.515319775))
            ThreePointArc((6.730935434, 14.515319775), (2.083317107, 12.812485701), (3.786151182, 8.164867374))
            ThreePointArc((3.786151182, 8.164867374), (6.184060598, 6.538913863), (7.941141438, 4.235359803))
        make_face()
        with BuildLine():
            ThreePointArc((7.941141438, -4.235359803), (6.184060598, -6.538913863), (3.786151182, -8.164867374))
            ThreePointArc((3.786151182, -8.164867374), (2.083317107, -12.812485701), (6.730935434, -14.515319775))
            ThreePointArc((6.730935434, -14.515319775), (10.993885508, -11.624735757), (14.117584779, -7.529528538))
            ThreePointArc((14.117584779, -7.529528538), (12.676447476, -2.7942225), (7.941141438, -4.235359803))
        make_face()
        with BuildLine():
            ThreePointArc((-6.730935434, -14.515319775), (-2.083317107, -12.812485701), (-3.786151182, -8.164867374))
            ThreePointArc((-3.786151182, -8.164867374), (-6.184060598, -6.538913863), (-7.941141438, -4.235359803))
            ThreePointArc((-7.941141438, -4.235359803), (-12.676447476, -2.7942225), (-14.117584779, -7.529528538))
            ThreePointArc((-14.117584779, -7.529528538), (-10.993885508, -11.624735757), (-6.730935434, -14.515319775))
        make_face()
        Circle(SKETCH6_R_2)
    extrude(amount=-CUT_EXTRUDE5_DEPTH, mode=Mode.SUBTRACT)


solid = part.part
